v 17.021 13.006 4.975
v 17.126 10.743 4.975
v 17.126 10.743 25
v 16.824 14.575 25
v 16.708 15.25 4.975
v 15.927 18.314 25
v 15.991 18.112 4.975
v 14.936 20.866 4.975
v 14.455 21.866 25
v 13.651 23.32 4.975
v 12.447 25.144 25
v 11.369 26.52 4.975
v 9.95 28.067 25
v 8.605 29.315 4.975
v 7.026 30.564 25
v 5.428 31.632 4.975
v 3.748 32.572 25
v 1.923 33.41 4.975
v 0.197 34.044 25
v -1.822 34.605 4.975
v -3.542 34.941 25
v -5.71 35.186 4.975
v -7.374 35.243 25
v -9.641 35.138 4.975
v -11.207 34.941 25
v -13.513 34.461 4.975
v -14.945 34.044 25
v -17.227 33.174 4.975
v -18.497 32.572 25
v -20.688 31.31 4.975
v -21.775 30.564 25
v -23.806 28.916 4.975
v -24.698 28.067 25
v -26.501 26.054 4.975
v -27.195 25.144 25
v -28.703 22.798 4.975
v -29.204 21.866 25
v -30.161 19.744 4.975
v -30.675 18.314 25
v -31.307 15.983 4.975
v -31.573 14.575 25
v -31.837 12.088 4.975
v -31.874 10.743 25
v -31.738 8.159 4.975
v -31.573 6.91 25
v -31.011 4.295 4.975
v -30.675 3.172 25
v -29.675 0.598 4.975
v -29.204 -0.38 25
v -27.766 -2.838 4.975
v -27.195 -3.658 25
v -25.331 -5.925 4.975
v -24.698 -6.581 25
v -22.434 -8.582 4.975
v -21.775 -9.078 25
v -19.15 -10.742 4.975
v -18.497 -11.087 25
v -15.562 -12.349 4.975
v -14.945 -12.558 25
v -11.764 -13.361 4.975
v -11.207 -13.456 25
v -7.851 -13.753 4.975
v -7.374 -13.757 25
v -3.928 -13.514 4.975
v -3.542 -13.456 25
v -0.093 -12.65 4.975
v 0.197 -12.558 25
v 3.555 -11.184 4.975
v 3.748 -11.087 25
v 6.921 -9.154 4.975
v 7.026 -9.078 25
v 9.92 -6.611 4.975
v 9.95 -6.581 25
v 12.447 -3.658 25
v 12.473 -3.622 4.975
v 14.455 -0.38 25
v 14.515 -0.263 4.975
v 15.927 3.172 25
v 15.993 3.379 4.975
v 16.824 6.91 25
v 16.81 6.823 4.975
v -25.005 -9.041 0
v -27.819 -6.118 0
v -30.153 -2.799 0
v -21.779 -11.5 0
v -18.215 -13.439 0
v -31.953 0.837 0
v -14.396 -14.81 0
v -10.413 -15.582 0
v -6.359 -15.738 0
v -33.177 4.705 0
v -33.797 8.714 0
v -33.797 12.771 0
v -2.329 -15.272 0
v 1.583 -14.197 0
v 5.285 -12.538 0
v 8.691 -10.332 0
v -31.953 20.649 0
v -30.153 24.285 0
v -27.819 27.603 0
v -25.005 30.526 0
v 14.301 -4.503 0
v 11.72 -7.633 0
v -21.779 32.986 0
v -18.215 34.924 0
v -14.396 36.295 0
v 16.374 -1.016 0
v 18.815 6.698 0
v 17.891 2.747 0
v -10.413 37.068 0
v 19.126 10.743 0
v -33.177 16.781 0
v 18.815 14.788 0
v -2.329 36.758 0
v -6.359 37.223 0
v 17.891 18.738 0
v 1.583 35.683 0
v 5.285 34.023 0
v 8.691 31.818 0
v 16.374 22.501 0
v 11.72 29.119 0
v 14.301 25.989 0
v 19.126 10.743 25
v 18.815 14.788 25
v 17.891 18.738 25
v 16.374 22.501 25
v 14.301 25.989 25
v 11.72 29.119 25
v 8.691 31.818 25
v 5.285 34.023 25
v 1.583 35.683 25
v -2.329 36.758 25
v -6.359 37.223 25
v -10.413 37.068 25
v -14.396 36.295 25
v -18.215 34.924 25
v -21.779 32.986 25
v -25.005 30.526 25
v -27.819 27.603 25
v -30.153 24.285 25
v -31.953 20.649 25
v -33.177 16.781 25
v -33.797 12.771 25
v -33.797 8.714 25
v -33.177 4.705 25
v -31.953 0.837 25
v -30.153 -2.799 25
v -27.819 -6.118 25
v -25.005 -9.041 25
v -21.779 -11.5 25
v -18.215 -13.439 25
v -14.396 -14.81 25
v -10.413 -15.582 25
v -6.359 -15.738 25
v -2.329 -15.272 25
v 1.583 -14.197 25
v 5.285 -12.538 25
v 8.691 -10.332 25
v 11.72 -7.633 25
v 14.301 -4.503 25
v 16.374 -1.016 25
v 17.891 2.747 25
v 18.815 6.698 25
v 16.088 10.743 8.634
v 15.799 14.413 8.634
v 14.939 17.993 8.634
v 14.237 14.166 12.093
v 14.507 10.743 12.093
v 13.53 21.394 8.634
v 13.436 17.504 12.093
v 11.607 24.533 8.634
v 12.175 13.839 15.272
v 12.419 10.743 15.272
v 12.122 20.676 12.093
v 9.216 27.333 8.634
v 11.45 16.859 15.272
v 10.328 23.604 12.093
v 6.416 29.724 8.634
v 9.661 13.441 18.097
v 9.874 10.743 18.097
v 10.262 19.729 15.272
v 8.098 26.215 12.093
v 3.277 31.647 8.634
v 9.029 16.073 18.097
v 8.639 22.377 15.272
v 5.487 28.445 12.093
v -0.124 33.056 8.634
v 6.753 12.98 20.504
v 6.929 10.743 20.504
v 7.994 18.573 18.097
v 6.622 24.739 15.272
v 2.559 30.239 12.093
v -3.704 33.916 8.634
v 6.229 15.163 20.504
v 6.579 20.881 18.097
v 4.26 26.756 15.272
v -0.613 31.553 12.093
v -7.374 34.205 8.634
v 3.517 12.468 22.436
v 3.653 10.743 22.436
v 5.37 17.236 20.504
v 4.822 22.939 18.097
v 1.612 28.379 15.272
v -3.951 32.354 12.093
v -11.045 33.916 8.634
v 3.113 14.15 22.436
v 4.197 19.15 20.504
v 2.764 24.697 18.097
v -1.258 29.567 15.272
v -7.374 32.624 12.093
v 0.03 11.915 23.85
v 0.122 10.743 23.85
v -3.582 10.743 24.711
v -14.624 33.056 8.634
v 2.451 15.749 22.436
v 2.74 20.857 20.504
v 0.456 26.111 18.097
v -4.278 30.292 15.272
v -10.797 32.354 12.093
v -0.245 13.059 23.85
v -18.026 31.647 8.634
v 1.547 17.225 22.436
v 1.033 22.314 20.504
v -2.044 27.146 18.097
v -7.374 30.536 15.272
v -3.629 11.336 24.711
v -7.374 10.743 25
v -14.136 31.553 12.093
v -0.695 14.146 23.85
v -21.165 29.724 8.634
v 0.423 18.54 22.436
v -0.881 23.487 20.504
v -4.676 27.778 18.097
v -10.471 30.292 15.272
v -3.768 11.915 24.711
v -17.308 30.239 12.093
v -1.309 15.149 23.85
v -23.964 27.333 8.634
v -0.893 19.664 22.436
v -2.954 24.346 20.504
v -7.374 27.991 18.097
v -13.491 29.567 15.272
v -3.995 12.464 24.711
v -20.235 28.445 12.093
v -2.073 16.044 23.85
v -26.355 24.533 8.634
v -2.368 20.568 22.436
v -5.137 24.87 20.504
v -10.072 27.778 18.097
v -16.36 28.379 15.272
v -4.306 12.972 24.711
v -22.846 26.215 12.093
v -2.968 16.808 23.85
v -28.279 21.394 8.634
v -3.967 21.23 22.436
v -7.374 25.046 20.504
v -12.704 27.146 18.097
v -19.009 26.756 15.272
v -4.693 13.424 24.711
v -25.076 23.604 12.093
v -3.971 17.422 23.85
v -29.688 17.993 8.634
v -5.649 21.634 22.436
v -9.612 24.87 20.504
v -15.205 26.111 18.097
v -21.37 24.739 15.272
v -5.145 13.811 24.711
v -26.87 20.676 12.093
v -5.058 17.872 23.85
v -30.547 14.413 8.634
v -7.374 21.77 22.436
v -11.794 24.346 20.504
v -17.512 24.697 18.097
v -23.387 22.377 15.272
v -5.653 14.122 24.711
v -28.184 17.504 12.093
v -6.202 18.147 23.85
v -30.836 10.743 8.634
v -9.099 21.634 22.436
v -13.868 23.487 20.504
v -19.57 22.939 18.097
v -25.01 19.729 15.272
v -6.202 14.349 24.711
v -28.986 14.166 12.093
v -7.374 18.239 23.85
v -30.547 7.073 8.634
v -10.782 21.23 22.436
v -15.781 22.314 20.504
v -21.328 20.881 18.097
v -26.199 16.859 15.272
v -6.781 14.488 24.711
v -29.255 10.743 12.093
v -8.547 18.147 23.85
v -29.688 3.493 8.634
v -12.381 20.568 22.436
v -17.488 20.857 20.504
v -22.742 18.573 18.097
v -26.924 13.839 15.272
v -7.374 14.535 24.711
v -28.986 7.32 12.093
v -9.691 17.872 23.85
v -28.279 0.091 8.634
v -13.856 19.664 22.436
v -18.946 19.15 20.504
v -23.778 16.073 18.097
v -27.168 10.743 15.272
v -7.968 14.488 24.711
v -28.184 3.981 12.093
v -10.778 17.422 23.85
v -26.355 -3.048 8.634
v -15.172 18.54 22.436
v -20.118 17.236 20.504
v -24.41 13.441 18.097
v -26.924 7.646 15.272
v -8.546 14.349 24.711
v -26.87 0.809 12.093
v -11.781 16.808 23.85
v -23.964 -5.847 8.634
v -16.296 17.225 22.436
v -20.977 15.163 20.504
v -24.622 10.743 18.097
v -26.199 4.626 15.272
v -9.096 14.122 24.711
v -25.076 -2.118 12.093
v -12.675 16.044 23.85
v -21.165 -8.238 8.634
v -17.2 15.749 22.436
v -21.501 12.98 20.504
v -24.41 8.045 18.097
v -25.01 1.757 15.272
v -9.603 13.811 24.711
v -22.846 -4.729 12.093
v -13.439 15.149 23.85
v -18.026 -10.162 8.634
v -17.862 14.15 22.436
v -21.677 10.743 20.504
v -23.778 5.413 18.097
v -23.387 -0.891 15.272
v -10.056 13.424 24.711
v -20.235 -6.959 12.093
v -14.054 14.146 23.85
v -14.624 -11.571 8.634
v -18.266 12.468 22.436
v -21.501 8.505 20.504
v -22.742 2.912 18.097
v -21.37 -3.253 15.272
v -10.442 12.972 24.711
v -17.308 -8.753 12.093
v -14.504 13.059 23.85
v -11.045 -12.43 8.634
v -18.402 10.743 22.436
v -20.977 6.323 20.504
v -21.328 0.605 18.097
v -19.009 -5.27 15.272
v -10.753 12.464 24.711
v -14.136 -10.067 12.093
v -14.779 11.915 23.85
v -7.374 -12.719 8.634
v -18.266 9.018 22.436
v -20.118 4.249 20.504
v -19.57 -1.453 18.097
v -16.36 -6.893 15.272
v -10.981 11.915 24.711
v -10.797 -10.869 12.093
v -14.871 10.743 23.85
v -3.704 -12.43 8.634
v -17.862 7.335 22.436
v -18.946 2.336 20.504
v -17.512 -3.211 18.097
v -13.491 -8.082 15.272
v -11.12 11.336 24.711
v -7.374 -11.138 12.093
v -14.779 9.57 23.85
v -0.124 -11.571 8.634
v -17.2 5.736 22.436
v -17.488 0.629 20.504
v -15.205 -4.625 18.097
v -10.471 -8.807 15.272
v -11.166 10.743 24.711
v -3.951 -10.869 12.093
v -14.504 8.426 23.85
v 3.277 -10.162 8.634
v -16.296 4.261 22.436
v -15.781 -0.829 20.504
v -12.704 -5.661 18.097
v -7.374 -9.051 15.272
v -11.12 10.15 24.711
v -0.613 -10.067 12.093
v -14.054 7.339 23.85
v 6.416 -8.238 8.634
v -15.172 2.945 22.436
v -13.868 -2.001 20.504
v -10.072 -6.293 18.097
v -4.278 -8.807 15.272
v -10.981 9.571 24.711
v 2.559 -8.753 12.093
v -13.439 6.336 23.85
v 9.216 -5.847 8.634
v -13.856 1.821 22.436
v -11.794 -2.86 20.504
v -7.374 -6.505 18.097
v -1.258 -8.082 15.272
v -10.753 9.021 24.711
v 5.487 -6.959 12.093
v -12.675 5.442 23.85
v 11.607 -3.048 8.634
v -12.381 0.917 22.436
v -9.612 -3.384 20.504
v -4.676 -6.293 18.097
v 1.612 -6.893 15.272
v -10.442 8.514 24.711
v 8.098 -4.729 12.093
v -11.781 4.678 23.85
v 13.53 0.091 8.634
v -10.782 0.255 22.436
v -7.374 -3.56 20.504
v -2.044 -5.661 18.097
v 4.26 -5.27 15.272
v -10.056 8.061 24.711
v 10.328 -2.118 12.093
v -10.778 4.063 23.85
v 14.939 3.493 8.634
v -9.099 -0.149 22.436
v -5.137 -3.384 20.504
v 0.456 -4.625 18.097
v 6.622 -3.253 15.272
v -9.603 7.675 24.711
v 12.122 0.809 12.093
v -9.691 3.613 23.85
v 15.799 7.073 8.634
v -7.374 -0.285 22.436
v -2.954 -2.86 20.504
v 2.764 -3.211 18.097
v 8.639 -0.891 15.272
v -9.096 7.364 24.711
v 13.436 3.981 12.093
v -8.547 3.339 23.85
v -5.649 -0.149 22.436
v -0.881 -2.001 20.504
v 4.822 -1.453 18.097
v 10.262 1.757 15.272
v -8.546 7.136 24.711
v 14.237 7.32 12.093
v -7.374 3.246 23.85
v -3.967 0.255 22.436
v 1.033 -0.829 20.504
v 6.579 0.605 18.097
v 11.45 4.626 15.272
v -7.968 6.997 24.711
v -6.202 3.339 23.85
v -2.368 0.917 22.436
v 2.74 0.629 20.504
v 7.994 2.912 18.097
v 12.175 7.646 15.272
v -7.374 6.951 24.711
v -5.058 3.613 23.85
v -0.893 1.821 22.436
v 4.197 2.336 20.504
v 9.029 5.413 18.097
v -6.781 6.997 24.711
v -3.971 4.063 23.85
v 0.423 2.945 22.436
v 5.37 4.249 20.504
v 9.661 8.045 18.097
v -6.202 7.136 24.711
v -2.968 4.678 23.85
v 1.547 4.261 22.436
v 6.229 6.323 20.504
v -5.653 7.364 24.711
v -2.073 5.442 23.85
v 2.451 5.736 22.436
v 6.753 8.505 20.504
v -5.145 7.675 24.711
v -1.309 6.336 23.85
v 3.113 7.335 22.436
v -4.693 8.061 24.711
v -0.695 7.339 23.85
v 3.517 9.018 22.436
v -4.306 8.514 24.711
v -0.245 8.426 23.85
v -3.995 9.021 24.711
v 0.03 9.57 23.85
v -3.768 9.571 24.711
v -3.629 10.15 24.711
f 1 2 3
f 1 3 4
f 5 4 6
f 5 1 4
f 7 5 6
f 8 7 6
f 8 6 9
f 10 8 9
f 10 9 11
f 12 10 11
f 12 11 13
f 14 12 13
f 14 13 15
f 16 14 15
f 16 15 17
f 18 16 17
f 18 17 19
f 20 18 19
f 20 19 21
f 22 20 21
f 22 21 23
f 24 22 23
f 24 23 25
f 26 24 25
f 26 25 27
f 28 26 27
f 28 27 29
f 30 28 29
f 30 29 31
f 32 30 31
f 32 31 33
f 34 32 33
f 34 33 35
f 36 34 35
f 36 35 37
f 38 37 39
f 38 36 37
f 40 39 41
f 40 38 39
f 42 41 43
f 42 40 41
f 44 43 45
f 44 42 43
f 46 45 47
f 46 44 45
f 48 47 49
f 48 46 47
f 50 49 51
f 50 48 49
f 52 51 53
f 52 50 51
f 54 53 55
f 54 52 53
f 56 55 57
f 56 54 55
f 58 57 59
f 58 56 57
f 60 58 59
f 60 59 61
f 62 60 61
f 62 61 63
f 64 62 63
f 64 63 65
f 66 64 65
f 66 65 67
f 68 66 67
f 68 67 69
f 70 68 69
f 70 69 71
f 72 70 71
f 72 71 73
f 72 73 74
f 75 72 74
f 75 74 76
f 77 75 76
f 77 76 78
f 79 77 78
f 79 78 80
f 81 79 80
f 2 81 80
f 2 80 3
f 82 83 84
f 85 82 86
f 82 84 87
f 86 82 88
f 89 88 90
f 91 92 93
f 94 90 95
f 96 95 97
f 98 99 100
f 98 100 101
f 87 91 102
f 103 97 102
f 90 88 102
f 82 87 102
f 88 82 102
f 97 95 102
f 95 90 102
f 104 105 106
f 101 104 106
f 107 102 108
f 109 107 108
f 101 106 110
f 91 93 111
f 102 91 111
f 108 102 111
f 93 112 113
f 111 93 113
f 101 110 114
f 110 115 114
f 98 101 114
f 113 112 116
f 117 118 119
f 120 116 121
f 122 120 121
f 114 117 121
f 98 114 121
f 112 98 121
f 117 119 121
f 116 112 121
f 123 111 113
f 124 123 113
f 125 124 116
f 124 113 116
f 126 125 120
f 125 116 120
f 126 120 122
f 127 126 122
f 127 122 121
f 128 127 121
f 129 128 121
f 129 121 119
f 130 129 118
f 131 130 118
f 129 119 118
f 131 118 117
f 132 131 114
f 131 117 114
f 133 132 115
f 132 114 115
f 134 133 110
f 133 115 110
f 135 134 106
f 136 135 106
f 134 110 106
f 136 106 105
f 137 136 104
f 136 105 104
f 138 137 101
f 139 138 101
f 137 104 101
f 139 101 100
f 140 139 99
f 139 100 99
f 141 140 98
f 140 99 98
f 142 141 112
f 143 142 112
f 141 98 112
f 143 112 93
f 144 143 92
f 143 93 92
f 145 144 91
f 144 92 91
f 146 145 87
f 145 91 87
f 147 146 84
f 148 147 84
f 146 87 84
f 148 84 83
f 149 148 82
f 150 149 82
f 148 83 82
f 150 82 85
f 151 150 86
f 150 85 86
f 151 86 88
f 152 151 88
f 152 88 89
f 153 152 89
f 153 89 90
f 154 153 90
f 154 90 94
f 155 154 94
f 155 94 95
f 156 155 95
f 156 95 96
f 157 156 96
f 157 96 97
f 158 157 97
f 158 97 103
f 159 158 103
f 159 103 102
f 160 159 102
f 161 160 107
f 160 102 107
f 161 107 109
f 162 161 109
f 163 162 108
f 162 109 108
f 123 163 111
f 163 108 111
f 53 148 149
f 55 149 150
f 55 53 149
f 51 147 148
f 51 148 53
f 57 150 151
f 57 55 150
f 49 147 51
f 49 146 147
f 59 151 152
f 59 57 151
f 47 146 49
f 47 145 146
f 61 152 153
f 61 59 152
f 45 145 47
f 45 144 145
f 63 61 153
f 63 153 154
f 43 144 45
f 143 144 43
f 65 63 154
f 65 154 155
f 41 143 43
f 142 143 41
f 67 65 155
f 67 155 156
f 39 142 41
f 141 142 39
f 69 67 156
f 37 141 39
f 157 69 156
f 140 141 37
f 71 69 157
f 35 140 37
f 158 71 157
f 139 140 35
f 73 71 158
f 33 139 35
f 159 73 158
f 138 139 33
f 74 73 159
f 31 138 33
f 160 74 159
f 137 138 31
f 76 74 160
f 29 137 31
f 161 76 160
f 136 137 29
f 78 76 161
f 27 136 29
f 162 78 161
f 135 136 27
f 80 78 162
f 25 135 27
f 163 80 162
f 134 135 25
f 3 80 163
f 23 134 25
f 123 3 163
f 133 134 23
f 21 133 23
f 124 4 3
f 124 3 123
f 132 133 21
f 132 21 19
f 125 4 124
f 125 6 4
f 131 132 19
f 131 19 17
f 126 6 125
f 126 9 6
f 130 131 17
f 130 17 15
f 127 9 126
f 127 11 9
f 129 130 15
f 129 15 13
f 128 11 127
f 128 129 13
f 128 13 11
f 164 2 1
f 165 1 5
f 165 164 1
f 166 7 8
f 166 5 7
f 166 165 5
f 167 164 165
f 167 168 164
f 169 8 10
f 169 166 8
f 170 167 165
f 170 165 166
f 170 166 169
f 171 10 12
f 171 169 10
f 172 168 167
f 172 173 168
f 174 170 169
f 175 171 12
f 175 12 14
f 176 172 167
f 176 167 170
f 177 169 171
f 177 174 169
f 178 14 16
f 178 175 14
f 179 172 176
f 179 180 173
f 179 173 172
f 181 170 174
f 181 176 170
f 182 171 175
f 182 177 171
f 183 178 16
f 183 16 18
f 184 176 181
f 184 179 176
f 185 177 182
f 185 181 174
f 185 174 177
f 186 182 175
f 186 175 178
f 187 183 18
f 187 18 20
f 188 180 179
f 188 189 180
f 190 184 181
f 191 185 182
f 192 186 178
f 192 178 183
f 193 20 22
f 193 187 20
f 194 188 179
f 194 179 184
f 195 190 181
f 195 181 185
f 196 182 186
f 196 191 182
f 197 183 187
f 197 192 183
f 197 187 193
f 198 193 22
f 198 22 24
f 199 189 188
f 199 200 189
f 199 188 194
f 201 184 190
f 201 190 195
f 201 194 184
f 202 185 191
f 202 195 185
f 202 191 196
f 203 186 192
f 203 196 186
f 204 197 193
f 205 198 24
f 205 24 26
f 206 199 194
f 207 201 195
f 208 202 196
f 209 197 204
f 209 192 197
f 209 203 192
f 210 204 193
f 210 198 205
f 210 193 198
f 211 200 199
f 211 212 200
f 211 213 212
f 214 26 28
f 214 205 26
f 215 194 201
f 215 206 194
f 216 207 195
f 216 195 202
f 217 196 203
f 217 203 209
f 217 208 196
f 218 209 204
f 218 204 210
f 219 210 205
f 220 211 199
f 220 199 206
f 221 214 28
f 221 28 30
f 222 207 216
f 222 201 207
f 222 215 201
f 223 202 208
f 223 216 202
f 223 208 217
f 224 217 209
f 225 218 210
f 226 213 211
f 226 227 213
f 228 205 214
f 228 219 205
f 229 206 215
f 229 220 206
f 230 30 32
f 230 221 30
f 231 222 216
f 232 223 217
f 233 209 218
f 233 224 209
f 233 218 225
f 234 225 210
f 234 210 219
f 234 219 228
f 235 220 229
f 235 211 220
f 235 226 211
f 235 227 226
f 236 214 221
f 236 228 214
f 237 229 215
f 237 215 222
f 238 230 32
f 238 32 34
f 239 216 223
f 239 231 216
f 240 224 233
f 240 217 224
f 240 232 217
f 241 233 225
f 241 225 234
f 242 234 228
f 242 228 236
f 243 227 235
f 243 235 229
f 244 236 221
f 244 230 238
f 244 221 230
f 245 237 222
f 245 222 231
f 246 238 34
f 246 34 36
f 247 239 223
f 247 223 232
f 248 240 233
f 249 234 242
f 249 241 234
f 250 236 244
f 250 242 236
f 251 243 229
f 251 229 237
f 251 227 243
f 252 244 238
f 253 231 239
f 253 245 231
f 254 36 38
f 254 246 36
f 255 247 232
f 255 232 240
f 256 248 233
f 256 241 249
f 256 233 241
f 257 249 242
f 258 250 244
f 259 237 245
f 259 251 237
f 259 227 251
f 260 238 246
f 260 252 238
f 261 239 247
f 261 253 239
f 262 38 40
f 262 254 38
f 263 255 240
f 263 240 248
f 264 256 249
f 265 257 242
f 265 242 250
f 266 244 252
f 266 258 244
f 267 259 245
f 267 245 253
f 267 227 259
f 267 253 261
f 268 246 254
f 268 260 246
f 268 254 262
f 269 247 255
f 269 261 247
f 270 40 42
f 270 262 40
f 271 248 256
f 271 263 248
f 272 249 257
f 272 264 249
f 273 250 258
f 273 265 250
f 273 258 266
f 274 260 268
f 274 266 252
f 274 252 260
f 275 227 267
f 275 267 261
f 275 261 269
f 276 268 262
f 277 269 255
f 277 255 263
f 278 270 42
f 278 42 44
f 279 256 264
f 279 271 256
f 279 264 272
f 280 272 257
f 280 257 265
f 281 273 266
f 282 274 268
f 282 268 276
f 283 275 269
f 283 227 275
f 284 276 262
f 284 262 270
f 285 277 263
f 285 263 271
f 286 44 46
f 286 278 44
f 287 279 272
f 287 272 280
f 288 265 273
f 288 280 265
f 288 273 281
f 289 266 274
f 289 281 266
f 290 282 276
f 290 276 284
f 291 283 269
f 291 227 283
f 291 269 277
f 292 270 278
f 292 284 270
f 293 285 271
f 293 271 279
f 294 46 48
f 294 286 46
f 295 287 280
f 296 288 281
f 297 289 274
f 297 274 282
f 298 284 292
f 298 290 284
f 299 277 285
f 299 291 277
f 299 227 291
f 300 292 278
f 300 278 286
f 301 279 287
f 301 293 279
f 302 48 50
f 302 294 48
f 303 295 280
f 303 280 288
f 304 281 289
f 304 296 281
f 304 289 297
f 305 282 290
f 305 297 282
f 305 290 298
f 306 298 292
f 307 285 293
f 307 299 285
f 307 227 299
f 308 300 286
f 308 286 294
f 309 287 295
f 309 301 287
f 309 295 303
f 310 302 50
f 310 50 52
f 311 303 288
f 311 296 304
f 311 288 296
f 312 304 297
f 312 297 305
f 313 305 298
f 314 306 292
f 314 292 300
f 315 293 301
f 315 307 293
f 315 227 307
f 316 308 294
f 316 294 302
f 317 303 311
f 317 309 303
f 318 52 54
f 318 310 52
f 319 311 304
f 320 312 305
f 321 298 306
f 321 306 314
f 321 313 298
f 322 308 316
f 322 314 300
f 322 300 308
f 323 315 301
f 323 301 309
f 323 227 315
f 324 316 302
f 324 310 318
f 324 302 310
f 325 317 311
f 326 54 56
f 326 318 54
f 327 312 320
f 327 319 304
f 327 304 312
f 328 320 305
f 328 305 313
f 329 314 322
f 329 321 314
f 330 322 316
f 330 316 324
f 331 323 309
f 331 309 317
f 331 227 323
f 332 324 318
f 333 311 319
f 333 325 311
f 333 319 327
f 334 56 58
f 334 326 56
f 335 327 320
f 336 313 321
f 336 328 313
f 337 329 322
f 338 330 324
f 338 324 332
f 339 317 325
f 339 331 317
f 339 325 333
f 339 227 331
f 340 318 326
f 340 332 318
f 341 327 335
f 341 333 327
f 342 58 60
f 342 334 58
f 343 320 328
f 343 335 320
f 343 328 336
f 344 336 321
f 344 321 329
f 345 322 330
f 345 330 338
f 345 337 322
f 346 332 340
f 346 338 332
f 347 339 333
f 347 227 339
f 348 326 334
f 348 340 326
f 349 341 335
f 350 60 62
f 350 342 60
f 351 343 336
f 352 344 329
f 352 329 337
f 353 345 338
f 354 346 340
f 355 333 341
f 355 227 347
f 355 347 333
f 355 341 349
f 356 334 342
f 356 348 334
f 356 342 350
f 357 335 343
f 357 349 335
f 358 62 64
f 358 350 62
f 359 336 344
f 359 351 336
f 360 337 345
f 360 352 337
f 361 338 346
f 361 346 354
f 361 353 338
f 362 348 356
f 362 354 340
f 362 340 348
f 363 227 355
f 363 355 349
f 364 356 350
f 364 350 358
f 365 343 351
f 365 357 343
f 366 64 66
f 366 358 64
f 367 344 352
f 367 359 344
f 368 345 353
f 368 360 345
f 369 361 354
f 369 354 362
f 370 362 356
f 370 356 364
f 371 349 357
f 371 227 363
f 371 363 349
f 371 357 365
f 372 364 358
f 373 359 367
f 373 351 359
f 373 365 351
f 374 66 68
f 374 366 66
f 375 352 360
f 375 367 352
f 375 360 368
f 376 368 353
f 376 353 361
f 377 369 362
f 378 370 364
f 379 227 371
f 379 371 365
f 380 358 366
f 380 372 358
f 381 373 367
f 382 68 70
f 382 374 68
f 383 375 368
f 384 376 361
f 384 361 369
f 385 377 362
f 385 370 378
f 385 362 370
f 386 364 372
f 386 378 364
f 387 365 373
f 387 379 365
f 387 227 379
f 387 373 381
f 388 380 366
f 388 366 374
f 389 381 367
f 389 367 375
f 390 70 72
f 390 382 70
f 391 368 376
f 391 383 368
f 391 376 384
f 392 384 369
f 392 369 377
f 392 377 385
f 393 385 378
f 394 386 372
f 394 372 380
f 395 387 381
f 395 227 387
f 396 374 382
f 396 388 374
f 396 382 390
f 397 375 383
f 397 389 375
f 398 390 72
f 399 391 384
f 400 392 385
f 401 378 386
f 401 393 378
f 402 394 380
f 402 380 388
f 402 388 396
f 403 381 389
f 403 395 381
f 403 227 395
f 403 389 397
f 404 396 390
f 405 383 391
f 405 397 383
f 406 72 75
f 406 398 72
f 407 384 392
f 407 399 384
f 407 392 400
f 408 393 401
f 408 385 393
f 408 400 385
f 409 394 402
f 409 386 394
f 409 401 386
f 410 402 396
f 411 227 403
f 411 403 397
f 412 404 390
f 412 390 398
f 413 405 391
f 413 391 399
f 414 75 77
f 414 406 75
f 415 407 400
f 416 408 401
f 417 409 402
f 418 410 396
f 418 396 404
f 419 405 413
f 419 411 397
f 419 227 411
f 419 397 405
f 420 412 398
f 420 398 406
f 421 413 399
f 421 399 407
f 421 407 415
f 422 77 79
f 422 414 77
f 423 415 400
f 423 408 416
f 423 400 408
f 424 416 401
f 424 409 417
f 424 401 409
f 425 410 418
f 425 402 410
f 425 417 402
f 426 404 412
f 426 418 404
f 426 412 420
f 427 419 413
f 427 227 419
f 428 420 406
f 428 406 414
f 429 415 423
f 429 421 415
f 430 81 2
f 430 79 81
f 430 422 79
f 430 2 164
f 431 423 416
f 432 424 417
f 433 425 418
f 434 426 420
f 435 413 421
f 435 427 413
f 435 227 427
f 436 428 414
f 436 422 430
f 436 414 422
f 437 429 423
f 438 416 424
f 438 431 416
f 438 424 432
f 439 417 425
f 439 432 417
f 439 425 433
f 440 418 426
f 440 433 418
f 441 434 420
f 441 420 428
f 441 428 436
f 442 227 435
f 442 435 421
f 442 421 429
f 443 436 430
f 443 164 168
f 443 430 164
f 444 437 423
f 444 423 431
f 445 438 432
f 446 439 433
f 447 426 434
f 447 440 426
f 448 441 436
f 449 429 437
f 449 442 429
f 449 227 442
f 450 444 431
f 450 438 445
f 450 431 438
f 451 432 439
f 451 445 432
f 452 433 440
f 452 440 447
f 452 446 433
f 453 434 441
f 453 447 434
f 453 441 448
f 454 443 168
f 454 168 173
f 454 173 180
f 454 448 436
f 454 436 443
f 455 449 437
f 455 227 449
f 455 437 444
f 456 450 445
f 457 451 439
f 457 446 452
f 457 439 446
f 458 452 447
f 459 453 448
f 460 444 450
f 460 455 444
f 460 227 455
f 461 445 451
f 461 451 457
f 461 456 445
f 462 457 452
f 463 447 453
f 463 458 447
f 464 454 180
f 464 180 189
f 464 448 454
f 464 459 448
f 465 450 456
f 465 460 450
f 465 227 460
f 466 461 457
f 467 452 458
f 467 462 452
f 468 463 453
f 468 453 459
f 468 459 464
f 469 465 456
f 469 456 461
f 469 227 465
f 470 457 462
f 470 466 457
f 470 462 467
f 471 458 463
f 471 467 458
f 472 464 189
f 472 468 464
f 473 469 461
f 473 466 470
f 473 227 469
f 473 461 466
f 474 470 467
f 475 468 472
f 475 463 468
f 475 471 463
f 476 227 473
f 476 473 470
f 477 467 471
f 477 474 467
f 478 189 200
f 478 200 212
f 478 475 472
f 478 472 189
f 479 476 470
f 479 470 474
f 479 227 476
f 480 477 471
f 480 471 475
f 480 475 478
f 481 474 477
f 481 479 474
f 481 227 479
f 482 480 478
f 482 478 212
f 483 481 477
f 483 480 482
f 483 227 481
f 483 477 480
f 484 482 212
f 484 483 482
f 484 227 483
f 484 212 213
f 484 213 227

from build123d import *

# Parameters (mm, degrees)
F0_R     = 25
F1_DEPTH = 25
F2_R     = 24.99999
F3_R     = 26.5
F3_R_2   = 24.5
F4_DEPTH = 25


# Not quite as in the source:
# - a fillet or chamfer is up to 0.001 mm smaller than in the source, because OpenCascade refuses the exact size


with BuildPart() as f1:
    # F0 (on Top) → F1 (new body)
    with BuildSketch(Plane.XY):
        with Locations((-7.374277804, 10.7427751645)):
            Circle(F0_R)
    extrude(amount=F1_DEPTH)

    # F2 (radius 25 in the source; OpenCascade refuses exactly that, so slightly less here)
    f2_edges = [f1.edges().sort_by_distance(p)[0] for p in [
        (-32.374278, 10.742775, 25),
    ]]
    fillet(f2_edges, radius=F2_R)

    # F3 (on Top) → F4 (join)
    with BuildSketch(Plane.XY):
        with Locations((-7.374277804, 10.7427751645)):
            Circle(F3_R)
        with Locations((-7.374277804, 10.7427751645)):
            Circle(F3_R_2, mode=Mode.SUBTRACT)
    extrude(amount=F4_DEPTH)


solid = f1.part
